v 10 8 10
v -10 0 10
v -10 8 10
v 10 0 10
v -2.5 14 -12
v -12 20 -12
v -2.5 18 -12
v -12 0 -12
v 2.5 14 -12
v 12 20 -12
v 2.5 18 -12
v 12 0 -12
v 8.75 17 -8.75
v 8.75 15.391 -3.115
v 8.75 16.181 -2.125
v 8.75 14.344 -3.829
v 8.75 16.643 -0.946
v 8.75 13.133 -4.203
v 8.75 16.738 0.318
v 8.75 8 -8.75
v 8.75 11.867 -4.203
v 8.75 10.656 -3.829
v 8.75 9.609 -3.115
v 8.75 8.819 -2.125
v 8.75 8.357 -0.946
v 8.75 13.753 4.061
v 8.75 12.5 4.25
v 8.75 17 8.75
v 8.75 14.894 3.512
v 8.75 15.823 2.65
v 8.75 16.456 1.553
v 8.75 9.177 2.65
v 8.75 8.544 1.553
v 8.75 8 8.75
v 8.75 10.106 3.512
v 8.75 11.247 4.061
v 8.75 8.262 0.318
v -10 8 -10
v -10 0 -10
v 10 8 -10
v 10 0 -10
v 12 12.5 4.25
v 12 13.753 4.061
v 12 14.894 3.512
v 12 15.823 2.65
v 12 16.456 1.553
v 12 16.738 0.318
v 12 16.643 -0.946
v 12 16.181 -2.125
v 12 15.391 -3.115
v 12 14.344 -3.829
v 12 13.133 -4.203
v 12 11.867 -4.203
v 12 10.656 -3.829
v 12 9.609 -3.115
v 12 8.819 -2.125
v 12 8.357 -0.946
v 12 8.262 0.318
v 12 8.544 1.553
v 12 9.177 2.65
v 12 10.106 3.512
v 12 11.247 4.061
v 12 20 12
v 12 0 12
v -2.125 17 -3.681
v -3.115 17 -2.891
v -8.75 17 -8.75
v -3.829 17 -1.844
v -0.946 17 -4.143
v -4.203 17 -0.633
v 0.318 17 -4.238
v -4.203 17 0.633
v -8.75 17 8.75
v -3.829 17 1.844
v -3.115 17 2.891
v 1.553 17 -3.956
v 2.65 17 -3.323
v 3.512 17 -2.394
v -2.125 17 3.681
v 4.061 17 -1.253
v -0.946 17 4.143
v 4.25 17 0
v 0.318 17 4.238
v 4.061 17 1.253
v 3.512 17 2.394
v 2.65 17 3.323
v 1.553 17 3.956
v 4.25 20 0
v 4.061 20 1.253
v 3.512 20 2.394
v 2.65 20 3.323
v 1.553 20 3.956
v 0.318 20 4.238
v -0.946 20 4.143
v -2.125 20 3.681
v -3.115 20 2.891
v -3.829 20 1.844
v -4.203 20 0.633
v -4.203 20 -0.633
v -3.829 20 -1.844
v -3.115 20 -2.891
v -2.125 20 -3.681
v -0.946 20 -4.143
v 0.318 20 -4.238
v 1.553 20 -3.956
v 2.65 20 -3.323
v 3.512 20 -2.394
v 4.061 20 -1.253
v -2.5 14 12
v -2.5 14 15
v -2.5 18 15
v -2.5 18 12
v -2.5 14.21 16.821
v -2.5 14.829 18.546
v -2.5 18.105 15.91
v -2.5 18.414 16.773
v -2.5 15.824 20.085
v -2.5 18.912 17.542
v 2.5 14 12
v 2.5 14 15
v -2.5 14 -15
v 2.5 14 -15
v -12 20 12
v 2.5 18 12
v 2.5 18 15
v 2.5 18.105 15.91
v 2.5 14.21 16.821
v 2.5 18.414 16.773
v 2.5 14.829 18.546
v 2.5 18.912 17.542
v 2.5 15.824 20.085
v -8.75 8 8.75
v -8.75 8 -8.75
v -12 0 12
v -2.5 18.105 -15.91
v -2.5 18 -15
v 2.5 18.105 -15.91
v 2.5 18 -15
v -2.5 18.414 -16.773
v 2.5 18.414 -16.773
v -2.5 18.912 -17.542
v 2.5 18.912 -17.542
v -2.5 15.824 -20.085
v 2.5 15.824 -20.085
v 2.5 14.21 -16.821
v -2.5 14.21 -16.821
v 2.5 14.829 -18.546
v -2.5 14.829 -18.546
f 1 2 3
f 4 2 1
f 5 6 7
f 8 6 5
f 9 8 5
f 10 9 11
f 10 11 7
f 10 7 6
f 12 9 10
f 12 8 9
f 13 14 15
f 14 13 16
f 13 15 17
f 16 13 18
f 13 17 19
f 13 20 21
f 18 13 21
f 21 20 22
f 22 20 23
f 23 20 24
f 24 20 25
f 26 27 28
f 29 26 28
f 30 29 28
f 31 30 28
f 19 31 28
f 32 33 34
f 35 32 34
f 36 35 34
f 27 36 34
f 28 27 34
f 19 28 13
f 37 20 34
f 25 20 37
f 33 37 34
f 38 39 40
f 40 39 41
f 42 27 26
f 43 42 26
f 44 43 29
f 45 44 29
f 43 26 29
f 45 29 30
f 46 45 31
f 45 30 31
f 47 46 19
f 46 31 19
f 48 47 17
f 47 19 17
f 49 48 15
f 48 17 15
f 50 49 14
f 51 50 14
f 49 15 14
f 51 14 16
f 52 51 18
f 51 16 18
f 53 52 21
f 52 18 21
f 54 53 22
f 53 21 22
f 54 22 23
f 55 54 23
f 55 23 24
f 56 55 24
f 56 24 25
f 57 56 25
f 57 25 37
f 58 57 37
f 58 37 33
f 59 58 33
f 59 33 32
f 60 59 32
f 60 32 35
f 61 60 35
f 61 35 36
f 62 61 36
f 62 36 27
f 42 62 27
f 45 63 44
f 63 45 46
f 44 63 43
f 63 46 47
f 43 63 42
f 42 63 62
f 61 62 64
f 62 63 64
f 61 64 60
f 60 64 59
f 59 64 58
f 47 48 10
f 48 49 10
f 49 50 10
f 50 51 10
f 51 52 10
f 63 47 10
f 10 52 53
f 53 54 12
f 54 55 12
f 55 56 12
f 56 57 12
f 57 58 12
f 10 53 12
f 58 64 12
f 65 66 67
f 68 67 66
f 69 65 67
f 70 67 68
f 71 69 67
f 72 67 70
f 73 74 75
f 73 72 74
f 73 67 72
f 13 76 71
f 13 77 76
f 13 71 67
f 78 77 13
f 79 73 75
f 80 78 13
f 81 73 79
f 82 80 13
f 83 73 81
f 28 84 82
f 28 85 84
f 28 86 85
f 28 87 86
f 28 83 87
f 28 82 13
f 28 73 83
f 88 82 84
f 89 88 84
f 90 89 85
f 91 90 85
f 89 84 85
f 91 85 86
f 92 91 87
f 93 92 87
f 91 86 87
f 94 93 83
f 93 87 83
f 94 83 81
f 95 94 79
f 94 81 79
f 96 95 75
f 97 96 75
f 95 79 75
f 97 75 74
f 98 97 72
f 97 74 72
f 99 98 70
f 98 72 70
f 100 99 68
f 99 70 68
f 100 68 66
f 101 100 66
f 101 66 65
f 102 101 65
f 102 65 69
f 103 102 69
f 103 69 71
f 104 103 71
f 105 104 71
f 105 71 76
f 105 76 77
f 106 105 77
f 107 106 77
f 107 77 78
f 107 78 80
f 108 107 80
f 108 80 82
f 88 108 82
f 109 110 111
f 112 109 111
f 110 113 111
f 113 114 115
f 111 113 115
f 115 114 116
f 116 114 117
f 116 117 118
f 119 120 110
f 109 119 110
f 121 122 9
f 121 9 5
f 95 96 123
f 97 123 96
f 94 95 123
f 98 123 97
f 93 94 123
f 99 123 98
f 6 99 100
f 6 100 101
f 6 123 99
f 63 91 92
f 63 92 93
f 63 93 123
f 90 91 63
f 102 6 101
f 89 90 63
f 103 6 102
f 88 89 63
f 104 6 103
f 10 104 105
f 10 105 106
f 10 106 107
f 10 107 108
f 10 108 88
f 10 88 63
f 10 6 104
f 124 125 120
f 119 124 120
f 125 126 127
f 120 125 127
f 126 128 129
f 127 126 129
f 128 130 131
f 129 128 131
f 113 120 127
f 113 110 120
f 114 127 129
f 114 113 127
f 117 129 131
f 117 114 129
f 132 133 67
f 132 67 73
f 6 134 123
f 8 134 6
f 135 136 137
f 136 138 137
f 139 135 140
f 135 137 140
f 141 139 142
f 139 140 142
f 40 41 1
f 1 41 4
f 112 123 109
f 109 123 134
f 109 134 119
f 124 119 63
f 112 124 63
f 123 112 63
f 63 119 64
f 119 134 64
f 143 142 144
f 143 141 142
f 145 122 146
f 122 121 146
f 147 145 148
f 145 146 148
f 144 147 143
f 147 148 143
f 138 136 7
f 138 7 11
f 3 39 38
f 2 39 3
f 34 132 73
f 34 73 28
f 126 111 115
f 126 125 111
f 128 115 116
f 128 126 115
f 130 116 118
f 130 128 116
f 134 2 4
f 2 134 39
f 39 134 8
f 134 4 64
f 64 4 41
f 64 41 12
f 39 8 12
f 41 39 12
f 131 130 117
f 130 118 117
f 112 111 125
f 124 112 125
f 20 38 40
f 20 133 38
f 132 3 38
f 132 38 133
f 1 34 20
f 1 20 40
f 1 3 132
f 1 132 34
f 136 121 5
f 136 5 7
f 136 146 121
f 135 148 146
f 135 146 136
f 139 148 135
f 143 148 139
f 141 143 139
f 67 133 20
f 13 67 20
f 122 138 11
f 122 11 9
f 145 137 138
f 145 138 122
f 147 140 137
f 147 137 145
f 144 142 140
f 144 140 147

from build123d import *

# Parameters (mm, degrees)
SKETCH1_W           = 24
SKETCH1_H           = 24
BOSS_EXTRUDE1_DEPTH = 20
SKETCH5_W           = 5
SKETCH5_H           = 4
SKETCH3_W           = 20
SKETCH3_H           = 20
CUT_EXTRUDE5_DEPTH  = 6
SKETCH14_W          = 20
SKETCH14_H          = 20
CUT_EXTRUDE6_DEPTH  = 2
SKETCH15_W          = 17.5
SKETCH15_H          = 17.5
CUT_EXTRUDE7_DEPTH  = 9
CUT_EXTRUDE8_REACH  = 5
SKETCH16_R          = 4.25
CUT_EXTRUDE9_REACH  = 5.25
SKETCH17_R          = 4.25


with BuildPart() as part:
    # Sketch1 → Boss-Extrude1 (new body)
    with BuildSketch(Plane(origin=(0, 0, 0), x_dir=(1, 0, 0), z_dir=(0, 1, 0))):
        Rectangle(SKETCH1_W, SKETCH1_H)
    extrude(amount=BOSS_EXTRUDE1_DEPTH)

    # Sweep1: sweep along a path in Sketch6
    with BuildLine(Plane(origin=(0, 0, 0), x_dir=(0, 0, -1), z_dir=(1, 0, 0))) as sweep1_path:
        Line((12, 16), (15, 16))
        ThreePointArc((15, 16), (17.025627927, 16.352272006), (18.813398517, 17.367722833))
    # Sketch5 → Sweep1 (sweep)
    with BuildSketch(Plane(origin=(0, 0, -12), x_dir=(-1, 0, 0), z_dir=(0, 0, -1))):
        with Locations((0, 16)):
            Rectangle(SKETCH5_W, SKETCH5_H)
    sweep1 = sweep(path=sweep1_path.line)

    # Mirror1: Sweep1 across plane
    add(sweep1.mirror(Plane.XY))

    # Sketch3 → Cut-Extrude5 (cut)
    with BuildSketch(Plane.XZ):
        Rectangle(SKETCH3_W, SKETCH3_H)
    extrude(amount=-CUT_EXTRUDE5_DEPTH, mode=Mode.SUBTRACT)

    # Sketch14 → Cut-Extrude6 (cut)
    with BuildSketch(Plane.XZ.offset(-6)):
        Rectangle(SKETCH14_W, SKETCH14_H)
    extrude(amount=-CUT_EXTRUDE6_DEPTH, mode=Mode.SUBTRACT)

    # Sketch15 → Cut-Extrude7 (cut)
    with BuildSketch(Plane.XZ.offset(-8)):
        Rectangle(SKETCH15_W, SKETCH15_H)
    extrude(amount=-CUT_EXTRUDE7_DEPTH, mode=Mode.SUBTRACT)

    # Sketch16 → Cut-Extrude8 (cut, up to next)
    with BuildSketch(Plane.XZ.offset(-17), mode=Mode.PRIVATE) as cut_extrude8_sk1:
        Circle(SKETCH16_R)
    cut_extrude8_tool1 = extrude(cut_extrude8_sk1.sketch, amount=-CUT_EXTRUDE8_REACH, mode=Mode.PRIVATE) & part.part
    add(cut_extrude8_tool1.solids().sort_by_distance((0, 17, 0))[0], mode=Mode.SUBTRACT)

    # Sketch17 → Cut-Extrude9 (cut, up to next)
    with BuildSketch(Plane.ZY.offset(-8.75), mode=Mode.PRIVATE) as cut_extrude9_sk1:
        with Locations((0, 12.5)):
            Circle(SKETCH17_R)
    cut_extrude9_tool1 = extrude(cut_extrude9_sk1.sketch, amount=-CUT_EXTRUDE9_REACH, mode=Mode.PRIVATE) & part.part
    add(cut_extrude9_tool1.solids().sort_by_distance((8.75, 12.5, 0))[0], mode=Mode.SUBTRACT)


solid = part.part
